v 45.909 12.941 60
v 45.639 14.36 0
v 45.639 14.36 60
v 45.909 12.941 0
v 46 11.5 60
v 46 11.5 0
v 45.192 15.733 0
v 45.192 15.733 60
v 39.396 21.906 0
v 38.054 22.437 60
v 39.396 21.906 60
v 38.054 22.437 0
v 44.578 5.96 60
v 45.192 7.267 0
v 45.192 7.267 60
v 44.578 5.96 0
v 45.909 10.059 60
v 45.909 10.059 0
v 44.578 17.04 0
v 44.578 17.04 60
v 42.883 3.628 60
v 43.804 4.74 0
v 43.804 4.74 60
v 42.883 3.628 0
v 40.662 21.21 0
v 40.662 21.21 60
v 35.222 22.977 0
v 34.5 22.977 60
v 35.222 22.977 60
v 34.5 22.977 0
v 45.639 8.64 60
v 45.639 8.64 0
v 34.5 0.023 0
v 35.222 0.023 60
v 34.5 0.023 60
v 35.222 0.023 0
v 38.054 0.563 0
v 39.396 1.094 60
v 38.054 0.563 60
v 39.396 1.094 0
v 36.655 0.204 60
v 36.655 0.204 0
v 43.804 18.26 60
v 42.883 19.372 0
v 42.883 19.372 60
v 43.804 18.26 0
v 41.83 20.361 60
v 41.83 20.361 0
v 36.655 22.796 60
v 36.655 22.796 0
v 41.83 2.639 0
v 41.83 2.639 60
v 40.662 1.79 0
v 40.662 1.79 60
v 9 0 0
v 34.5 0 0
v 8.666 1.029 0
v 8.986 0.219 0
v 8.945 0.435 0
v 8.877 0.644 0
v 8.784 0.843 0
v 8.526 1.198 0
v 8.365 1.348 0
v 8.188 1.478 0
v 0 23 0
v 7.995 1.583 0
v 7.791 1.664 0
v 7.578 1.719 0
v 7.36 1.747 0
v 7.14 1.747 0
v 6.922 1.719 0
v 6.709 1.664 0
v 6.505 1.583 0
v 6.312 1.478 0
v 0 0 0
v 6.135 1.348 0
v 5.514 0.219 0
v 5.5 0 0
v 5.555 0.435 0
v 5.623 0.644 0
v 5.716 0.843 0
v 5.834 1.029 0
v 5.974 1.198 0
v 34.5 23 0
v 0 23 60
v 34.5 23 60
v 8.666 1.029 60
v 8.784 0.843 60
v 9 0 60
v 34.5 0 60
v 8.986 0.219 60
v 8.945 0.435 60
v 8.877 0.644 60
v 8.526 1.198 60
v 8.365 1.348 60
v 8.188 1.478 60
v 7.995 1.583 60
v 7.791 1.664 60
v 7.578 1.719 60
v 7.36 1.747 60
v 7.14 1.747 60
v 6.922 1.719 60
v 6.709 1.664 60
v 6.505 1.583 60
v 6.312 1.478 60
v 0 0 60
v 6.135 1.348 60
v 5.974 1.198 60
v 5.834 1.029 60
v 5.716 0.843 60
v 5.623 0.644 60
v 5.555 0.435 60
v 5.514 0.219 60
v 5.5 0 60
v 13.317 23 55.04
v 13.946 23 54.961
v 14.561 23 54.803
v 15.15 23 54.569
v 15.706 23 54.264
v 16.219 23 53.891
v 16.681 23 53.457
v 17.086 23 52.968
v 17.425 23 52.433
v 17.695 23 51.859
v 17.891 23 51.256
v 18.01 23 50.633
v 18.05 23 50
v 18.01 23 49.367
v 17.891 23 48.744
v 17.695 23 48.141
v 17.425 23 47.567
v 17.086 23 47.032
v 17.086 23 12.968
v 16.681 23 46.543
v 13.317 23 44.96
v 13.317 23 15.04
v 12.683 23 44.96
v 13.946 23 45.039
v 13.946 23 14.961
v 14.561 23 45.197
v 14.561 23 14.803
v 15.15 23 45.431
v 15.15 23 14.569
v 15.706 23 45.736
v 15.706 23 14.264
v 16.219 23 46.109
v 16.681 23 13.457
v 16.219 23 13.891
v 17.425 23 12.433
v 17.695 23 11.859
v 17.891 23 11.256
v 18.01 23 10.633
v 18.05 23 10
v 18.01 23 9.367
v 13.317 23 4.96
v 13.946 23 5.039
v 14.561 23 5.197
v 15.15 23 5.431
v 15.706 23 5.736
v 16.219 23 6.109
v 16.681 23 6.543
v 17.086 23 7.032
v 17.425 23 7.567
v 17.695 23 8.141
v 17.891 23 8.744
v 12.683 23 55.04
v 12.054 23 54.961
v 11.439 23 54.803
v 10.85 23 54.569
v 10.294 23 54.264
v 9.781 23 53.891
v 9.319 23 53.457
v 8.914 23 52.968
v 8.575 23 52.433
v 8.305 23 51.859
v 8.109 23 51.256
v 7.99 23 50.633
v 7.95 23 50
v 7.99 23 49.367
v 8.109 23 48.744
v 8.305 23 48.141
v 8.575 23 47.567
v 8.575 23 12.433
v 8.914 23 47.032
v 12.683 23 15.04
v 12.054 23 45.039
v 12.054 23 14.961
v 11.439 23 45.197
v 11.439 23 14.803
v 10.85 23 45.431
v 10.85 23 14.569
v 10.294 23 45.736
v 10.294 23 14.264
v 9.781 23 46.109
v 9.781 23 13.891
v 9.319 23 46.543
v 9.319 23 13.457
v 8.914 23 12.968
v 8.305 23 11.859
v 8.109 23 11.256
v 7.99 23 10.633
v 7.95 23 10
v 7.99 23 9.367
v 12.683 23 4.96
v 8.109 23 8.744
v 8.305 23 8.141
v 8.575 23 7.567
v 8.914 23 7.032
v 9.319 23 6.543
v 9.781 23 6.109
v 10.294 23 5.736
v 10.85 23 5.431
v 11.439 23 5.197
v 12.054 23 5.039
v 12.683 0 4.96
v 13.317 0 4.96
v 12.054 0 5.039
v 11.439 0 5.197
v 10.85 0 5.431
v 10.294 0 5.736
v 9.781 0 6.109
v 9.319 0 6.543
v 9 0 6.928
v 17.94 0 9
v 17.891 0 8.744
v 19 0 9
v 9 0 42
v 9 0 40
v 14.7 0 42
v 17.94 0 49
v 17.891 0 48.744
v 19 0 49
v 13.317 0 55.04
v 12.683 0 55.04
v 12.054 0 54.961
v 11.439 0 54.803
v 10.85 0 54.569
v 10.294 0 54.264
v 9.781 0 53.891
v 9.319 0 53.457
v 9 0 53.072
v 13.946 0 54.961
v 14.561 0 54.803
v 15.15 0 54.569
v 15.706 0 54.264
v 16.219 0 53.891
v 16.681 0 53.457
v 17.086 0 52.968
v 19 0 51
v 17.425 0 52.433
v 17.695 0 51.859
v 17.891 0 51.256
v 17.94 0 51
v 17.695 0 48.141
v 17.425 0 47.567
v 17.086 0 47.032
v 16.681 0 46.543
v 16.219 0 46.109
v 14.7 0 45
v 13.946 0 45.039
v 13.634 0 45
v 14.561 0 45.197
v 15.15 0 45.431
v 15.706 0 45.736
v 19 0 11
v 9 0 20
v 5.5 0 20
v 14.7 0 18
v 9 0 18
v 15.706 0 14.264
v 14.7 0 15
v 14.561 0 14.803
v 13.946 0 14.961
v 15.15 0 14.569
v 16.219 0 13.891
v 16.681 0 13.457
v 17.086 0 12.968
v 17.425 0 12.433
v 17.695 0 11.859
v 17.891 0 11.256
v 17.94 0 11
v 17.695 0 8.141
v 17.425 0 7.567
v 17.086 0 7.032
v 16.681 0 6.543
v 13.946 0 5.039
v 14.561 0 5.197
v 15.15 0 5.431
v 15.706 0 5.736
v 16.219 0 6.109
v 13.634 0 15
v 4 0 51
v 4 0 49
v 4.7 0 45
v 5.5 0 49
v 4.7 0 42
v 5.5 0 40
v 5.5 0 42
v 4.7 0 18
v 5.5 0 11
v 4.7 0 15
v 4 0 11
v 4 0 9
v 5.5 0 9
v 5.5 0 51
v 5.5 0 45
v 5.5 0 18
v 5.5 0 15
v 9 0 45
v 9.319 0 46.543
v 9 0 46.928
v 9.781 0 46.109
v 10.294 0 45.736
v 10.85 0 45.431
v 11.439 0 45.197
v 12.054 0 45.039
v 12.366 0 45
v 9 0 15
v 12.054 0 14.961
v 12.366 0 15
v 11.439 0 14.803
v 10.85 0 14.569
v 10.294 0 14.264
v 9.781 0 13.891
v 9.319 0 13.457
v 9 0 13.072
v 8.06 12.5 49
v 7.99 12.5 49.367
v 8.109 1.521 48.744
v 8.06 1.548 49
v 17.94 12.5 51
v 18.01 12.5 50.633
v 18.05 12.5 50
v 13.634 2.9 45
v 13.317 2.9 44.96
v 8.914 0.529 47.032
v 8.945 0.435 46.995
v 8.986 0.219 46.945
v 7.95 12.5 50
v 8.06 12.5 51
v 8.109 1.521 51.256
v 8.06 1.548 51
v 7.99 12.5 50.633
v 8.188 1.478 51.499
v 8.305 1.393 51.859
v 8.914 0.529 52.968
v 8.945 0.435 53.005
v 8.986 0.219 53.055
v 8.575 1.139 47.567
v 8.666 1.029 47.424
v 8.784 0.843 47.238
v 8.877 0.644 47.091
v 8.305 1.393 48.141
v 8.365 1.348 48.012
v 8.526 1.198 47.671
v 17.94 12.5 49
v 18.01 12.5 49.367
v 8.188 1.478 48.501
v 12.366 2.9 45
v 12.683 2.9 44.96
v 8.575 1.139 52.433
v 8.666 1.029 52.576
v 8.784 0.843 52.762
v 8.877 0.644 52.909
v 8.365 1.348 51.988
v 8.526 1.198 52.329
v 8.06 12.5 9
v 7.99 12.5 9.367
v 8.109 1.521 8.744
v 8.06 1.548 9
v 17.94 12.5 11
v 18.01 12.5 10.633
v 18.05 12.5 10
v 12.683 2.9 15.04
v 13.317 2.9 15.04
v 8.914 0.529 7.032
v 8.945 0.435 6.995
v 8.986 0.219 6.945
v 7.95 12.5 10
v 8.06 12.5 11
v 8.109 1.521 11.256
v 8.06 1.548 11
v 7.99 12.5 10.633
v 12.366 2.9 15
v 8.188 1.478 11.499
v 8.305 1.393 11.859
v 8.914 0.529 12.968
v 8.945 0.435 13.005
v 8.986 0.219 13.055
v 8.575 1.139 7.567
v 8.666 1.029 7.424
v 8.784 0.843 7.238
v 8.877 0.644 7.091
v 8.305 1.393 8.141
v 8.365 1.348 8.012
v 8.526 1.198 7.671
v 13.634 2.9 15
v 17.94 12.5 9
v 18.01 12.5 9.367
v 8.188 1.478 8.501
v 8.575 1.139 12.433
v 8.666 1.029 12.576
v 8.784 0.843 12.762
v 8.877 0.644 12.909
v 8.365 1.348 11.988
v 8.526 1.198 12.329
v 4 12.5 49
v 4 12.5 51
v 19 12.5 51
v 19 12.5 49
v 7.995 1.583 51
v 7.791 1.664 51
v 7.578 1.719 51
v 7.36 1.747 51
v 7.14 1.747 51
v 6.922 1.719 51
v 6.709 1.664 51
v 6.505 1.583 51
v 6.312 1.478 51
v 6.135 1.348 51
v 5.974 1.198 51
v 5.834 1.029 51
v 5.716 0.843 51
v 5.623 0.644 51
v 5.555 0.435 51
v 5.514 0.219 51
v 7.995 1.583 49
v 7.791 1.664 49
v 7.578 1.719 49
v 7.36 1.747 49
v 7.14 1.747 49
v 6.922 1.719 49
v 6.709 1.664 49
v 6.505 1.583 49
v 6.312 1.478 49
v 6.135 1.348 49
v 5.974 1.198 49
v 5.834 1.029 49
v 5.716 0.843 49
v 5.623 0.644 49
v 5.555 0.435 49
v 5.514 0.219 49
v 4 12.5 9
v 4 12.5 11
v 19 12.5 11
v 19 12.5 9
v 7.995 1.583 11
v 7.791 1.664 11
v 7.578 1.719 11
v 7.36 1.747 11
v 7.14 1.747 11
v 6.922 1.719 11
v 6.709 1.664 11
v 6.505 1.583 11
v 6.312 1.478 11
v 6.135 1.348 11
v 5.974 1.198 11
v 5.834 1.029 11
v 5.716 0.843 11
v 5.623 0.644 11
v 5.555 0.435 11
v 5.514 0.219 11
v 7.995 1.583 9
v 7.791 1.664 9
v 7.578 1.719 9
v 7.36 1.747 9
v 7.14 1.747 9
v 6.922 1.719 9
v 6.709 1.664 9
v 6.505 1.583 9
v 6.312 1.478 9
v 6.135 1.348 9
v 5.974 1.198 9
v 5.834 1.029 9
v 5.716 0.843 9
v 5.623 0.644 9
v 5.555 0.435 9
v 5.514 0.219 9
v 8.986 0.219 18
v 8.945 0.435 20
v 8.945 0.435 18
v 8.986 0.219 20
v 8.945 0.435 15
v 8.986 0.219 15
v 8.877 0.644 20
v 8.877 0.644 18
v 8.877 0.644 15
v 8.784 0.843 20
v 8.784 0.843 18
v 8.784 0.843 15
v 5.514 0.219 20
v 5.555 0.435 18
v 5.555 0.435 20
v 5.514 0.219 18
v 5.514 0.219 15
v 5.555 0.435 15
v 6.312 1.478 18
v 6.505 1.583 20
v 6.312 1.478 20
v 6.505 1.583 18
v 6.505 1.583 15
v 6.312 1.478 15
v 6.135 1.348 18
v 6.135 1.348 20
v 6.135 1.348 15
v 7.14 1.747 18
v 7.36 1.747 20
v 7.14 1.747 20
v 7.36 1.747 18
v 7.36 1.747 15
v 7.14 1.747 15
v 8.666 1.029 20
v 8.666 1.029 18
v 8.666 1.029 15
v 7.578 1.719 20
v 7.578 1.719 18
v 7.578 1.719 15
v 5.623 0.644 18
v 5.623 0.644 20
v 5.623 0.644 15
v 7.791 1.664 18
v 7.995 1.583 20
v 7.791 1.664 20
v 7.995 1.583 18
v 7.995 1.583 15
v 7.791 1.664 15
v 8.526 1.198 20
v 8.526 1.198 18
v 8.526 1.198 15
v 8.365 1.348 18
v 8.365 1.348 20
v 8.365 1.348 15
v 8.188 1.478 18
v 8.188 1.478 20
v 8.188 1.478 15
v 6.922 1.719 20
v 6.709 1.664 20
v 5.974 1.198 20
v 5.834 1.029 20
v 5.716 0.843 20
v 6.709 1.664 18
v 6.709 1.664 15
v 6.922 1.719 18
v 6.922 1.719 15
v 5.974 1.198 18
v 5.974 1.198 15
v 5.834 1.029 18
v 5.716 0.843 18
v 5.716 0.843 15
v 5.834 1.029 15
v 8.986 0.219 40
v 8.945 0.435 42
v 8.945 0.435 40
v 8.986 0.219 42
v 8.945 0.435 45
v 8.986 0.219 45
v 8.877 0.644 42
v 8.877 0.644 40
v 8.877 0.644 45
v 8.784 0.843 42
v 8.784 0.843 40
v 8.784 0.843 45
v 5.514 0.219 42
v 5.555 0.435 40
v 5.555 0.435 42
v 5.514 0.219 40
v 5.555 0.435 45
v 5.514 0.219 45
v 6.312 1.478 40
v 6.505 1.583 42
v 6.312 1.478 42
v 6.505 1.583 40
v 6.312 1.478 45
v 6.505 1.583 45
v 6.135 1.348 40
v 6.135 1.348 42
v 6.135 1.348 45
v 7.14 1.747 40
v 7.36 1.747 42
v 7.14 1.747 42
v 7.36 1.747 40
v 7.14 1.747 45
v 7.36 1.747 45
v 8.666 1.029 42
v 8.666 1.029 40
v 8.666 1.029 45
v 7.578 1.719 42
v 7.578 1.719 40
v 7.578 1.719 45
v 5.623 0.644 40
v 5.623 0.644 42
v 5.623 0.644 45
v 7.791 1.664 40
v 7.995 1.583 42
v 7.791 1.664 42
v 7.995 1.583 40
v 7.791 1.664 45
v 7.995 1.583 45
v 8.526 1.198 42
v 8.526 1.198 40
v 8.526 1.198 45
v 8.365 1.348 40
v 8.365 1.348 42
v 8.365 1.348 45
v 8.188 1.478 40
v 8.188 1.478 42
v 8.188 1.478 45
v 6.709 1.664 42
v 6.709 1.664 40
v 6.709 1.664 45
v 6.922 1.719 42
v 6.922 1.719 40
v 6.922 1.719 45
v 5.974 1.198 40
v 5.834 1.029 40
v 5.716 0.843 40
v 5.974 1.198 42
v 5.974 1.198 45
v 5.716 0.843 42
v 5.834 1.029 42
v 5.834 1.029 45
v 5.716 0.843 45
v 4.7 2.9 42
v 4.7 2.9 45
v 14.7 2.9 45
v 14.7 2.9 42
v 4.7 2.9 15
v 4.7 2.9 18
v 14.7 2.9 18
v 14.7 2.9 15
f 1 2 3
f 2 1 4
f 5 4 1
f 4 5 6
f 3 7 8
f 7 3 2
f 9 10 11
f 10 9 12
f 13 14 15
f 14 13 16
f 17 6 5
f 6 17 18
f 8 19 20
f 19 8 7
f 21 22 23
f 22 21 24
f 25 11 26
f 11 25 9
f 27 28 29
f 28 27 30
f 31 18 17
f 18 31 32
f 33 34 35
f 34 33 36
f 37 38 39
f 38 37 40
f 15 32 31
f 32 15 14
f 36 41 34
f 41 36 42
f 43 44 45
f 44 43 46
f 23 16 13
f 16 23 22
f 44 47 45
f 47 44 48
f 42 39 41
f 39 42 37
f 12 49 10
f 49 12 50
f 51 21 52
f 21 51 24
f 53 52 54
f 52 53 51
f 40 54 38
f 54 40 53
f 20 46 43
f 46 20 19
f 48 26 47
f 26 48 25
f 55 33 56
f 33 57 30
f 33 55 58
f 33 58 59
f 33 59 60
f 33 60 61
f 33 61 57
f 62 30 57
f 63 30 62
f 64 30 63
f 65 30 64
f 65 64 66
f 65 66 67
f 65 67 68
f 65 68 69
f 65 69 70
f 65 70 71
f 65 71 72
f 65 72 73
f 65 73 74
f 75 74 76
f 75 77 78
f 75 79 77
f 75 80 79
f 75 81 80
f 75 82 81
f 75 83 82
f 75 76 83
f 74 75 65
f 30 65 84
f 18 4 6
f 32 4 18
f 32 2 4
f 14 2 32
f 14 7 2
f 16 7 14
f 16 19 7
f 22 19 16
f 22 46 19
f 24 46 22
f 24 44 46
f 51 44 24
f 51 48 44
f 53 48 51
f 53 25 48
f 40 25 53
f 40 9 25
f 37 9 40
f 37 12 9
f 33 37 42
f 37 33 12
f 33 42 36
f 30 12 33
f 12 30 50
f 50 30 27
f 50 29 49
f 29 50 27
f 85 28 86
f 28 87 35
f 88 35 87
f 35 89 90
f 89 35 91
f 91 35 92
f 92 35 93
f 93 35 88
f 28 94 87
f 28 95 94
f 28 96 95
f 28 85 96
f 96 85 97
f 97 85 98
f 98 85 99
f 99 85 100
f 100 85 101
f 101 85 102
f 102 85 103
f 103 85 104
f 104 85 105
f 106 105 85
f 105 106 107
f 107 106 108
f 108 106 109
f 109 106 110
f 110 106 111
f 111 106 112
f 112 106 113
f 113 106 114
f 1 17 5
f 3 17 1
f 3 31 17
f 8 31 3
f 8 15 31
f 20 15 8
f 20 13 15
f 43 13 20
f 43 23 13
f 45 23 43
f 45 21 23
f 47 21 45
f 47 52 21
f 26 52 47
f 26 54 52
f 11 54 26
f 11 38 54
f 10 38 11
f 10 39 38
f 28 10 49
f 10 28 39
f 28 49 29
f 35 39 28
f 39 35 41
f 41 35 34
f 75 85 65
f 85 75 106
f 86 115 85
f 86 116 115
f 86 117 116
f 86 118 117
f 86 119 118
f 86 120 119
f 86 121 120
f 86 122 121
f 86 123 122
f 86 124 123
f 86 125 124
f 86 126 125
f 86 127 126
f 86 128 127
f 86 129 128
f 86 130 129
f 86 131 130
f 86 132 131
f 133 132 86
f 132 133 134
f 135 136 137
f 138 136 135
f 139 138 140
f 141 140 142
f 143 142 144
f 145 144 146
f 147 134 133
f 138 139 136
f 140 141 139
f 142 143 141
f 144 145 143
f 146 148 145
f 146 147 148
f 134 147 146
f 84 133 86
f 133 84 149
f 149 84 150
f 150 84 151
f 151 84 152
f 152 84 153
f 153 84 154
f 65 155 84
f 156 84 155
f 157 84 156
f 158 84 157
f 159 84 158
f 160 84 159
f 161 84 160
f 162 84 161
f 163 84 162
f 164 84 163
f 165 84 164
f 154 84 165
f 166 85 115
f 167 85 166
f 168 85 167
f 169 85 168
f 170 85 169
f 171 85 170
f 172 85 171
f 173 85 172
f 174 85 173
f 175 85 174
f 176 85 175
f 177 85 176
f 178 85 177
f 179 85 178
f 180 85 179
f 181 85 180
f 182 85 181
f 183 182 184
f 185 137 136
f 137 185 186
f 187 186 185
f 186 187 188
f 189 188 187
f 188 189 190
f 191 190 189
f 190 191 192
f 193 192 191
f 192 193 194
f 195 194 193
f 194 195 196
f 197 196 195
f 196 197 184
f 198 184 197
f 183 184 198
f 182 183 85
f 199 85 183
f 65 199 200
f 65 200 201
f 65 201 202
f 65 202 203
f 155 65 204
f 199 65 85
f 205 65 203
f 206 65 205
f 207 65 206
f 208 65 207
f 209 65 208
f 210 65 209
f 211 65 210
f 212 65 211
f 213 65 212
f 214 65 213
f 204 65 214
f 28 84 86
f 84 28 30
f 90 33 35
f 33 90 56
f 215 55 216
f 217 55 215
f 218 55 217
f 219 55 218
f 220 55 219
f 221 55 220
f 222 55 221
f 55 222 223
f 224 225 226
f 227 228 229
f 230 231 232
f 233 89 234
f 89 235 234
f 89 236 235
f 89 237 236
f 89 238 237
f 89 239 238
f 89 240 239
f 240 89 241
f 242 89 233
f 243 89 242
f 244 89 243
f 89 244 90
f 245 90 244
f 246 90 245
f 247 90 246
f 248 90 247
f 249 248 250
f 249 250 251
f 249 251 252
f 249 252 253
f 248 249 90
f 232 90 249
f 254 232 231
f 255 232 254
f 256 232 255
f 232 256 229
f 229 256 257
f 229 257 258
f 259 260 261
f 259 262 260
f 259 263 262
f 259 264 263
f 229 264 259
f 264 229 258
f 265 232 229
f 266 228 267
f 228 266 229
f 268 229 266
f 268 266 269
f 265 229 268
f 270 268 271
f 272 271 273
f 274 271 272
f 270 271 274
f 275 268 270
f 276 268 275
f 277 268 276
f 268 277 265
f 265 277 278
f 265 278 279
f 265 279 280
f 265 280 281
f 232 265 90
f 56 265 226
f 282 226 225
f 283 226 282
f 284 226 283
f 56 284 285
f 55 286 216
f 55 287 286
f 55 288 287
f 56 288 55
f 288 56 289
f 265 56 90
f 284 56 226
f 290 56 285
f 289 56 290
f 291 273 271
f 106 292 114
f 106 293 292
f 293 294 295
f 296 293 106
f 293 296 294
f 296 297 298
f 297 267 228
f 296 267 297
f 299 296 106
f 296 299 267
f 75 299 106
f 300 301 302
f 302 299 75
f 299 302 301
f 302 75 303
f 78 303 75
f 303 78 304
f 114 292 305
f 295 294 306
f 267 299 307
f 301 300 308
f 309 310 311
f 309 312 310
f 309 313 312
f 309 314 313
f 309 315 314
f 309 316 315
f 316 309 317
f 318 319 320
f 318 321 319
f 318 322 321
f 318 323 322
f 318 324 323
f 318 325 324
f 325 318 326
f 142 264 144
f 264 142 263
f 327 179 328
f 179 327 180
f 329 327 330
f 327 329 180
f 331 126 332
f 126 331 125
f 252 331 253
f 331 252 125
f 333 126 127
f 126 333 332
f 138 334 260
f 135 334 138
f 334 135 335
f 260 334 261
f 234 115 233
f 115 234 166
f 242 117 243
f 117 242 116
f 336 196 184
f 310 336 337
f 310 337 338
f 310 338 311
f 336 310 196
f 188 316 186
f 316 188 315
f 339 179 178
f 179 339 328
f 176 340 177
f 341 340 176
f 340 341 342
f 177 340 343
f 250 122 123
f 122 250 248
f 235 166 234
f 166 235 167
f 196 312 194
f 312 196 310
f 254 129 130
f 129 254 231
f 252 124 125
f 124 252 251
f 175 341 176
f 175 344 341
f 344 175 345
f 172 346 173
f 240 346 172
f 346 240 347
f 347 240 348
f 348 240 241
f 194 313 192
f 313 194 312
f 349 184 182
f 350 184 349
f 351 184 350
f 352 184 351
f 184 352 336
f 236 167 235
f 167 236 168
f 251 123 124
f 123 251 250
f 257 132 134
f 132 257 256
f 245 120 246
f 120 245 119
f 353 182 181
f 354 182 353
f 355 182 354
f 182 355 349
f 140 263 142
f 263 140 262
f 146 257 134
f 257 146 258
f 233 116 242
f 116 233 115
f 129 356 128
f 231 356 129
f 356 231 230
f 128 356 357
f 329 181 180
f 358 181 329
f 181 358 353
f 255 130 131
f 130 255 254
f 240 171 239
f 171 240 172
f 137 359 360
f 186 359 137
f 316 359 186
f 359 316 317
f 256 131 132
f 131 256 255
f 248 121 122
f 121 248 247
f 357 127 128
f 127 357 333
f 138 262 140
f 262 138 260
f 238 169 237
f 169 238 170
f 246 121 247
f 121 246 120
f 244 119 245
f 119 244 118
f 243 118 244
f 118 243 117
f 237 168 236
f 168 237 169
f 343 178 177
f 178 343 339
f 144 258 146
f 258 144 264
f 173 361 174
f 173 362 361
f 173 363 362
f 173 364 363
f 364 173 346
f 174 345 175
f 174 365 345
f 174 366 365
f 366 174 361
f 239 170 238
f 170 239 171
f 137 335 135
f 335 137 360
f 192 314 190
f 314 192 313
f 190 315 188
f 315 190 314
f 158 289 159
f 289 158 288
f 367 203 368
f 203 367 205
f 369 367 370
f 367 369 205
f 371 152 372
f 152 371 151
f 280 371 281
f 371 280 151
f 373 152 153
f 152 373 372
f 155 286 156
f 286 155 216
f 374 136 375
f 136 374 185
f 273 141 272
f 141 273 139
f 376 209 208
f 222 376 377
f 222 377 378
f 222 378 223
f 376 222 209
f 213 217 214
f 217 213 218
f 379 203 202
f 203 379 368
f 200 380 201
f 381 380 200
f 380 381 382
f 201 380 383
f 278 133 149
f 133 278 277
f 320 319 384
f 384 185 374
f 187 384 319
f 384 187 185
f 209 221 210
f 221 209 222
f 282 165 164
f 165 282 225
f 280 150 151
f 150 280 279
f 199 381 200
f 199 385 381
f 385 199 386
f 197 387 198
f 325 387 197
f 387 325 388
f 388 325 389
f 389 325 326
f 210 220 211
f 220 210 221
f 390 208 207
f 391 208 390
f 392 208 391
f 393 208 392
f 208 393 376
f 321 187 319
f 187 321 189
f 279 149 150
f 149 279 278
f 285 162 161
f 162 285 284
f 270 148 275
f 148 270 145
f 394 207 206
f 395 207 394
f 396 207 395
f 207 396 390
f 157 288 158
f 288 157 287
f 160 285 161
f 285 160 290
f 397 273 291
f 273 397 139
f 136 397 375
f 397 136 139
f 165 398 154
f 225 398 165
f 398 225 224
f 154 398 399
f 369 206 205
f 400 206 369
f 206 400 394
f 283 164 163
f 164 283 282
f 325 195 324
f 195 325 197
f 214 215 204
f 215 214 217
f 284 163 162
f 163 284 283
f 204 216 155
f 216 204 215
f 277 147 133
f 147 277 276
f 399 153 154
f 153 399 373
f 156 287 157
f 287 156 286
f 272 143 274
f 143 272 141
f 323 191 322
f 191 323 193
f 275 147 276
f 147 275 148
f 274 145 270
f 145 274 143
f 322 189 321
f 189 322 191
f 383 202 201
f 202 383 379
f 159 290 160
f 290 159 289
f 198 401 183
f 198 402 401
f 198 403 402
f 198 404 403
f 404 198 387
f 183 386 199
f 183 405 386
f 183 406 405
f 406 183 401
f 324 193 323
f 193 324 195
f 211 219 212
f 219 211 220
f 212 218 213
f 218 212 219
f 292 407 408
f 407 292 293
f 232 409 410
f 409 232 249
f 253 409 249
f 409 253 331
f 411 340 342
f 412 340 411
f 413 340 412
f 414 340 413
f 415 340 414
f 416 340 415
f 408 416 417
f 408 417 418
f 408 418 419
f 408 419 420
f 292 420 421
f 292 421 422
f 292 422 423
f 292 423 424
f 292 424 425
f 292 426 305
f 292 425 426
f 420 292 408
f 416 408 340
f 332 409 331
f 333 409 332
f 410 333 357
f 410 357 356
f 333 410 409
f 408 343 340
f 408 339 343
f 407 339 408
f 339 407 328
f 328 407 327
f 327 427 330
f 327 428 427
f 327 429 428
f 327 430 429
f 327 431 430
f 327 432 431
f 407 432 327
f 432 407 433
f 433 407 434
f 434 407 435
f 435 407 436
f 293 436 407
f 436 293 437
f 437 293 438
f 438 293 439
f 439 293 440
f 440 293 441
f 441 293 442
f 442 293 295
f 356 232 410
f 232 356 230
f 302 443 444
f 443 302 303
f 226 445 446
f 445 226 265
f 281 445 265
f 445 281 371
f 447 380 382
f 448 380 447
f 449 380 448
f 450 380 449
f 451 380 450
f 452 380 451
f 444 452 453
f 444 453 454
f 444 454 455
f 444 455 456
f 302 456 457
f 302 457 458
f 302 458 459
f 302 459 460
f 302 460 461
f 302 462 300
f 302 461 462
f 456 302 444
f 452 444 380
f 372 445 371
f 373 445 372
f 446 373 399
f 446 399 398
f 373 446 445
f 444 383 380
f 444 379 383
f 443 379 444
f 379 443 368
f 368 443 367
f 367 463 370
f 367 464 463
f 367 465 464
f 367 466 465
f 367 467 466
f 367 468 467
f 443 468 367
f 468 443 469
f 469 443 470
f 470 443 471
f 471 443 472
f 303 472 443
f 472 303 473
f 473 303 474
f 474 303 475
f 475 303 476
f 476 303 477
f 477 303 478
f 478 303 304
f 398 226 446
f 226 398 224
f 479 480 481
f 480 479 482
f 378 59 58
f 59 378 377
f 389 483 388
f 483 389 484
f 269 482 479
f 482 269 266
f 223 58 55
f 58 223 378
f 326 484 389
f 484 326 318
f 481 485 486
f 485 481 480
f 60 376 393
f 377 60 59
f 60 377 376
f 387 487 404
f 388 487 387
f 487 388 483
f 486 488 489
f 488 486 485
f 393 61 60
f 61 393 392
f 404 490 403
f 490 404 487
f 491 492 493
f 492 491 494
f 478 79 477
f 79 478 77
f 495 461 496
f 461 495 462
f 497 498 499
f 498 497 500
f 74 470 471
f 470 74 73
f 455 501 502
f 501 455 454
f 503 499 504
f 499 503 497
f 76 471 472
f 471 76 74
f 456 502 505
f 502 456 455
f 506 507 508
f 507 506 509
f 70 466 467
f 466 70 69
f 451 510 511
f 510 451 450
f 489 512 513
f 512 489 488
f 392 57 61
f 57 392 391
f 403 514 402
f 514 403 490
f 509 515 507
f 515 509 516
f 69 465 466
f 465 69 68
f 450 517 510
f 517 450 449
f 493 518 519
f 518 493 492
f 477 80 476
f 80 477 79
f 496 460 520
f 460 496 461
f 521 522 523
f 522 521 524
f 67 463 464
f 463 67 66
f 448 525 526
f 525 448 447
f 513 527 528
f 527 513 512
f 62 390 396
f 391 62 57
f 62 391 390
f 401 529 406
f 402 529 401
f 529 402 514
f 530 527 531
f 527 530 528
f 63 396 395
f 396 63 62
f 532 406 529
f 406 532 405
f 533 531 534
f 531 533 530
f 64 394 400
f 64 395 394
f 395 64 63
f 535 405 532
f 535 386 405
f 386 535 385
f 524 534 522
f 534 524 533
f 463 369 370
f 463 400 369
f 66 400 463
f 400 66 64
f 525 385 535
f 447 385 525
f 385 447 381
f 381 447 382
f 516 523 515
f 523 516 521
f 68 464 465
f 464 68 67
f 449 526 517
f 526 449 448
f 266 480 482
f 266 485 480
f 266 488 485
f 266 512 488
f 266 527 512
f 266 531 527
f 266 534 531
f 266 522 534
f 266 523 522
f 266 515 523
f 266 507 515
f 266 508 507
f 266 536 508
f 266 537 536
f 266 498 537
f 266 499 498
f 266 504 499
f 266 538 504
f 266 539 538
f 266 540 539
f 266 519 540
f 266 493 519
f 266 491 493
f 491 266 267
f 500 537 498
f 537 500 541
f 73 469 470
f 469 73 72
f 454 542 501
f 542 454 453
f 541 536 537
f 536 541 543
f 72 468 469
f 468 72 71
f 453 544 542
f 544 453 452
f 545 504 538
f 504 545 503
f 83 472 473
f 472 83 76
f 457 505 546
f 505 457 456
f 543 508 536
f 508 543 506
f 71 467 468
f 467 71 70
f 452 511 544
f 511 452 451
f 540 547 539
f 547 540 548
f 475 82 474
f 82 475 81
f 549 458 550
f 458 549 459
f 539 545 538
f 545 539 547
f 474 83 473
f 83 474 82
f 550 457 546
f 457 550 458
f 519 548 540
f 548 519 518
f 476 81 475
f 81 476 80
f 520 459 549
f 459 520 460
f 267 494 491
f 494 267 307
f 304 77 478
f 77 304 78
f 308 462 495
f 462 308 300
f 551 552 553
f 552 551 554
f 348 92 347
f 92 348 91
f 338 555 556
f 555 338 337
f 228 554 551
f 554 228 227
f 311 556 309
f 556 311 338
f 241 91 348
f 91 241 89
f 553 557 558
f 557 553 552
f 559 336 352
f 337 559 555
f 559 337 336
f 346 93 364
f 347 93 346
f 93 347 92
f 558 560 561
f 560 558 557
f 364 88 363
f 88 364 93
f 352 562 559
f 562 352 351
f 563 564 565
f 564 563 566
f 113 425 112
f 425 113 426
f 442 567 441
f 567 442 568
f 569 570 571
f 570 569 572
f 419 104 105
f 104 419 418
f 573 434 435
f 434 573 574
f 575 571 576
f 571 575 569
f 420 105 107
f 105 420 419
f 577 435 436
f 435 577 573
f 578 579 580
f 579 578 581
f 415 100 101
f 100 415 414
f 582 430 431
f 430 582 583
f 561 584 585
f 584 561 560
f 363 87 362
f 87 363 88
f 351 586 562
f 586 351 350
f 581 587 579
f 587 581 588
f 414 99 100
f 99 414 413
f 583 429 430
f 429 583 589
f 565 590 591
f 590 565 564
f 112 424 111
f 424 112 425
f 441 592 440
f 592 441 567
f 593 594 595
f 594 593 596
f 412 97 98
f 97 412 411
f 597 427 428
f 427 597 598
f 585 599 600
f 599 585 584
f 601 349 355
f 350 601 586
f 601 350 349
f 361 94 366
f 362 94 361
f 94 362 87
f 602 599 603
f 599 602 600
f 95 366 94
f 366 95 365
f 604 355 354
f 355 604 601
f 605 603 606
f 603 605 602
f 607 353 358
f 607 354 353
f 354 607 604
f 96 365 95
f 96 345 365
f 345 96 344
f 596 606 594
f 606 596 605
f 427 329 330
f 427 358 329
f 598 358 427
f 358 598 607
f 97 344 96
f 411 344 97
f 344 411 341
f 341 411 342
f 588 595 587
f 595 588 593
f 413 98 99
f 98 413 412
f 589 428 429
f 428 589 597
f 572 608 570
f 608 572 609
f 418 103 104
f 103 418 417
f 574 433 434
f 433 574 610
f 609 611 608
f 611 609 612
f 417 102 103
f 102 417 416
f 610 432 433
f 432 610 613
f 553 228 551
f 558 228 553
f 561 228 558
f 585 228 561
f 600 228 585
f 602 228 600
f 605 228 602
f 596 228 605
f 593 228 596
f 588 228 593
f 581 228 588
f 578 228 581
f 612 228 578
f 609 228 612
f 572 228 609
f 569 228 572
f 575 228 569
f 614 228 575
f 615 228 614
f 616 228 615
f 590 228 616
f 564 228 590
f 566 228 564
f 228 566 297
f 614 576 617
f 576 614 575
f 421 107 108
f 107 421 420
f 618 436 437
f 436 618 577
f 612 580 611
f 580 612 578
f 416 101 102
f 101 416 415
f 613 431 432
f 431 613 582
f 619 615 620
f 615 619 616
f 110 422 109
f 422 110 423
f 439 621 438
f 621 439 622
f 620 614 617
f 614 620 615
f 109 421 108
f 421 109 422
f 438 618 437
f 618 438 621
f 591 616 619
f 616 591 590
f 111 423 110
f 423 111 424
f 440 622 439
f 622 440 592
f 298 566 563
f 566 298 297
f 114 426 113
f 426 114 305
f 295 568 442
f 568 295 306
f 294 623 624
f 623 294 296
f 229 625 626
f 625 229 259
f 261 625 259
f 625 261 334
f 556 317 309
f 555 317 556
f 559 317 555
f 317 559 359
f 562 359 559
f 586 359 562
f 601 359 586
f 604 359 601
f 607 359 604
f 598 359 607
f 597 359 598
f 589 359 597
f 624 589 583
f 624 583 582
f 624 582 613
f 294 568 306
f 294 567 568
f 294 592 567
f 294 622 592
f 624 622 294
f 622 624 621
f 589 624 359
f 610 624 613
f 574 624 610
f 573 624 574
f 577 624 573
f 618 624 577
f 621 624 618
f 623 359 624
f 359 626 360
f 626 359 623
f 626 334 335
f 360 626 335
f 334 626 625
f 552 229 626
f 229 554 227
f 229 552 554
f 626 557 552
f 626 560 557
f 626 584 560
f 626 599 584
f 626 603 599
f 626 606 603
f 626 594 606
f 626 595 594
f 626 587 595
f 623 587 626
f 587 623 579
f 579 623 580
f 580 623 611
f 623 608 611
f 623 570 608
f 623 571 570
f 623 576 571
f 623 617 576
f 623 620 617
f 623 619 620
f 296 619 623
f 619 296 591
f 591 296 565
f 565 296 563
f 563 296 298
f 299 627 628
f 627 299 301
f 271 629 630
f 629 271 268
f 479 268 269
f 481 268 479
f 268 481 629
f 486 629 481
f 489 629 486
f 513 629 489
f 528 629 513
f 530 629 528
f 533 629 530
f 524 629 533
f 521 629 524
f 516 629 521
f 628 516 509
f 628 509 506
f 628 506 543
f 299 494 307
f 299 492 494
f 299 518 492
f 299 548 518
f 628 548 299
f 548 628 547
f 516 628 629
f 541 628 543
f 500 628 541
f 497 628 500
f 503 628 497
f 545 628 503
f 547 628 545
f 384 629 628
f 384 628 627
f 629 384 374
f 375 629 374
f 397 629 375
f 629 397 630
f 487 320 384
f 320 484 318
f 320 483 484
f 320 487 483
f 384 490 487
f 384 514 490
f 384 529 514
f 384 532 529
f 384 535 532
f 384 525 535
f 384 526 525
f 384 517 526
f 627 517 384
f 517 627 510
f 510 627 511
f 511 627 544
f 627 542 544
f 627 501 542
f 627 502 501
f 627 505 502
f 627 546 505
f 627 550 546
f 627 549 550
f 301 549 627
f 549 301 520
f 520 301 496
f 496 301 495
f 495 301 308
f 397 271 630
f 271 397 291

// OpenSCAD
//Partie tenant les diam_tiges
largeur = 23;
hauteur=60;
diam_tige=10;
jeu_tige=0.1;
trou_de_vis_3 = 3.5;
largeur_ecrou_3 = 5.8;
epaisseur_ecrou_3 = 3;
profondeur_trou_vis_3 = 20;
x_cent_tige = 13;
z_cent_tige = 10;
//glissière
diam_bague = 15.9;
prof_bague=12.5;
chanfrein = 0.5;

facettes=50;
color("red")
//translate([0,0,largeur/2])
//rotate([0,-90,0])

difference(){
    // BLoc principal
    union() {
    translate([largeur*1.5,largeur/2,0])
    cylinder(h=hauteur,r=largeur/2,$fn=facettes);
    //translate([-largeur,-largeur/2,0])
    linear_extrude(height=hauteur)
    square([largeur+largeur/2,largeur]);
    }
    //trou no 1
    translate([x_cent_tige,largeur+1,hauteur-z_cent_tige])
    rotate([90,0,0])
    cylinder(h=largeur+2,r=(diam_tige+jeu_tige)/2,$fn=facettes);
    //trou no 2
    translate([x_cent_tige,largeur+1,z_cent_tige])
    rotate([90,0,0])
    cylinder(h=largeur+2,r=(diam_tige+jeu_tige)/2,$fn=facettes);
    // Coche no 2
    translate([4,-largeur/2-1,49])
    rotate([90,0,90])
    linear_extrude(height=15)
    square([largeur+2,2]);
    // Coche no 2
    translate([4,-largeur/2-1,9])
    rotate([90,0,90])
    linear_extrude(height=15)
    square([largeur+2,2]);
    //trou Vis de serrage 1
    translate([7.25,0,-1])
    cylinder(h=21,r=trou_de_vis_3/2,$fn=facettes);
    //trou Vis de serrage 2
    translate([7.25,0,40])
    cylinder(h=21,r=trou_de_vis_3/2,$fn=facettes);
    // Passage ecrou 1
    translate([largeur/2-largeur_ecrou_3-1,-largeur_ecrou_3/2,
hauteur-epaisseur_ecrou_3-diam_tige*1.5])
    rotate([90,0,90])
    linear_extrude(height=10)
    square([largeur_ecrou_3,epaisseur_ecrou_3]);
    // Passage ecrou 2
    translate([largeur/2-largeur_ecrou_3-1,-largeur_ecrou_3/2,diam_tige*1.5])
    rotate([90,0,90])
    linear_extrude(height=10)
    square([largeur_ecrou_3,epaisseur_ecrou_3]);
    translate([-largeur,0,0])
rotate_extrude($fn=facettes) 
polygon( points=
[[0,hauteur+1],//0
[diam_bague/2+chanfrein,hauteur+1],//1
[diam_bague/2+chanfrein,hauteur],//2
[diam_bague/2,hauteur-chanfrein],//3
[diam_bague/2,hauteur-prof_bague+chanfrein],//4
[diam_bague/2-chanfrein,hauteur-prof_bague],//5
[diam_tige/2+0.5+chanfrein,hauteur-prof_bague],//6
[diam_tige/2+0.5,hauteur-prof_bague-chanfrein],//7
[diam_tige/2+0.5,prof_bague+chanfrein], //8
[diam_tige/2+0.5+chanfrein,prof_bague],
[diam_bague/2-chanfrein,prof_bague],
[diam_bague/2,prof_bague-chanfrein], //11
[diam_bague/2,chanfrein],
[diam_bague/2+chanfrein,0],
[diam_bague/2+chanfrein,-1],
[0,-1]
]);
}
